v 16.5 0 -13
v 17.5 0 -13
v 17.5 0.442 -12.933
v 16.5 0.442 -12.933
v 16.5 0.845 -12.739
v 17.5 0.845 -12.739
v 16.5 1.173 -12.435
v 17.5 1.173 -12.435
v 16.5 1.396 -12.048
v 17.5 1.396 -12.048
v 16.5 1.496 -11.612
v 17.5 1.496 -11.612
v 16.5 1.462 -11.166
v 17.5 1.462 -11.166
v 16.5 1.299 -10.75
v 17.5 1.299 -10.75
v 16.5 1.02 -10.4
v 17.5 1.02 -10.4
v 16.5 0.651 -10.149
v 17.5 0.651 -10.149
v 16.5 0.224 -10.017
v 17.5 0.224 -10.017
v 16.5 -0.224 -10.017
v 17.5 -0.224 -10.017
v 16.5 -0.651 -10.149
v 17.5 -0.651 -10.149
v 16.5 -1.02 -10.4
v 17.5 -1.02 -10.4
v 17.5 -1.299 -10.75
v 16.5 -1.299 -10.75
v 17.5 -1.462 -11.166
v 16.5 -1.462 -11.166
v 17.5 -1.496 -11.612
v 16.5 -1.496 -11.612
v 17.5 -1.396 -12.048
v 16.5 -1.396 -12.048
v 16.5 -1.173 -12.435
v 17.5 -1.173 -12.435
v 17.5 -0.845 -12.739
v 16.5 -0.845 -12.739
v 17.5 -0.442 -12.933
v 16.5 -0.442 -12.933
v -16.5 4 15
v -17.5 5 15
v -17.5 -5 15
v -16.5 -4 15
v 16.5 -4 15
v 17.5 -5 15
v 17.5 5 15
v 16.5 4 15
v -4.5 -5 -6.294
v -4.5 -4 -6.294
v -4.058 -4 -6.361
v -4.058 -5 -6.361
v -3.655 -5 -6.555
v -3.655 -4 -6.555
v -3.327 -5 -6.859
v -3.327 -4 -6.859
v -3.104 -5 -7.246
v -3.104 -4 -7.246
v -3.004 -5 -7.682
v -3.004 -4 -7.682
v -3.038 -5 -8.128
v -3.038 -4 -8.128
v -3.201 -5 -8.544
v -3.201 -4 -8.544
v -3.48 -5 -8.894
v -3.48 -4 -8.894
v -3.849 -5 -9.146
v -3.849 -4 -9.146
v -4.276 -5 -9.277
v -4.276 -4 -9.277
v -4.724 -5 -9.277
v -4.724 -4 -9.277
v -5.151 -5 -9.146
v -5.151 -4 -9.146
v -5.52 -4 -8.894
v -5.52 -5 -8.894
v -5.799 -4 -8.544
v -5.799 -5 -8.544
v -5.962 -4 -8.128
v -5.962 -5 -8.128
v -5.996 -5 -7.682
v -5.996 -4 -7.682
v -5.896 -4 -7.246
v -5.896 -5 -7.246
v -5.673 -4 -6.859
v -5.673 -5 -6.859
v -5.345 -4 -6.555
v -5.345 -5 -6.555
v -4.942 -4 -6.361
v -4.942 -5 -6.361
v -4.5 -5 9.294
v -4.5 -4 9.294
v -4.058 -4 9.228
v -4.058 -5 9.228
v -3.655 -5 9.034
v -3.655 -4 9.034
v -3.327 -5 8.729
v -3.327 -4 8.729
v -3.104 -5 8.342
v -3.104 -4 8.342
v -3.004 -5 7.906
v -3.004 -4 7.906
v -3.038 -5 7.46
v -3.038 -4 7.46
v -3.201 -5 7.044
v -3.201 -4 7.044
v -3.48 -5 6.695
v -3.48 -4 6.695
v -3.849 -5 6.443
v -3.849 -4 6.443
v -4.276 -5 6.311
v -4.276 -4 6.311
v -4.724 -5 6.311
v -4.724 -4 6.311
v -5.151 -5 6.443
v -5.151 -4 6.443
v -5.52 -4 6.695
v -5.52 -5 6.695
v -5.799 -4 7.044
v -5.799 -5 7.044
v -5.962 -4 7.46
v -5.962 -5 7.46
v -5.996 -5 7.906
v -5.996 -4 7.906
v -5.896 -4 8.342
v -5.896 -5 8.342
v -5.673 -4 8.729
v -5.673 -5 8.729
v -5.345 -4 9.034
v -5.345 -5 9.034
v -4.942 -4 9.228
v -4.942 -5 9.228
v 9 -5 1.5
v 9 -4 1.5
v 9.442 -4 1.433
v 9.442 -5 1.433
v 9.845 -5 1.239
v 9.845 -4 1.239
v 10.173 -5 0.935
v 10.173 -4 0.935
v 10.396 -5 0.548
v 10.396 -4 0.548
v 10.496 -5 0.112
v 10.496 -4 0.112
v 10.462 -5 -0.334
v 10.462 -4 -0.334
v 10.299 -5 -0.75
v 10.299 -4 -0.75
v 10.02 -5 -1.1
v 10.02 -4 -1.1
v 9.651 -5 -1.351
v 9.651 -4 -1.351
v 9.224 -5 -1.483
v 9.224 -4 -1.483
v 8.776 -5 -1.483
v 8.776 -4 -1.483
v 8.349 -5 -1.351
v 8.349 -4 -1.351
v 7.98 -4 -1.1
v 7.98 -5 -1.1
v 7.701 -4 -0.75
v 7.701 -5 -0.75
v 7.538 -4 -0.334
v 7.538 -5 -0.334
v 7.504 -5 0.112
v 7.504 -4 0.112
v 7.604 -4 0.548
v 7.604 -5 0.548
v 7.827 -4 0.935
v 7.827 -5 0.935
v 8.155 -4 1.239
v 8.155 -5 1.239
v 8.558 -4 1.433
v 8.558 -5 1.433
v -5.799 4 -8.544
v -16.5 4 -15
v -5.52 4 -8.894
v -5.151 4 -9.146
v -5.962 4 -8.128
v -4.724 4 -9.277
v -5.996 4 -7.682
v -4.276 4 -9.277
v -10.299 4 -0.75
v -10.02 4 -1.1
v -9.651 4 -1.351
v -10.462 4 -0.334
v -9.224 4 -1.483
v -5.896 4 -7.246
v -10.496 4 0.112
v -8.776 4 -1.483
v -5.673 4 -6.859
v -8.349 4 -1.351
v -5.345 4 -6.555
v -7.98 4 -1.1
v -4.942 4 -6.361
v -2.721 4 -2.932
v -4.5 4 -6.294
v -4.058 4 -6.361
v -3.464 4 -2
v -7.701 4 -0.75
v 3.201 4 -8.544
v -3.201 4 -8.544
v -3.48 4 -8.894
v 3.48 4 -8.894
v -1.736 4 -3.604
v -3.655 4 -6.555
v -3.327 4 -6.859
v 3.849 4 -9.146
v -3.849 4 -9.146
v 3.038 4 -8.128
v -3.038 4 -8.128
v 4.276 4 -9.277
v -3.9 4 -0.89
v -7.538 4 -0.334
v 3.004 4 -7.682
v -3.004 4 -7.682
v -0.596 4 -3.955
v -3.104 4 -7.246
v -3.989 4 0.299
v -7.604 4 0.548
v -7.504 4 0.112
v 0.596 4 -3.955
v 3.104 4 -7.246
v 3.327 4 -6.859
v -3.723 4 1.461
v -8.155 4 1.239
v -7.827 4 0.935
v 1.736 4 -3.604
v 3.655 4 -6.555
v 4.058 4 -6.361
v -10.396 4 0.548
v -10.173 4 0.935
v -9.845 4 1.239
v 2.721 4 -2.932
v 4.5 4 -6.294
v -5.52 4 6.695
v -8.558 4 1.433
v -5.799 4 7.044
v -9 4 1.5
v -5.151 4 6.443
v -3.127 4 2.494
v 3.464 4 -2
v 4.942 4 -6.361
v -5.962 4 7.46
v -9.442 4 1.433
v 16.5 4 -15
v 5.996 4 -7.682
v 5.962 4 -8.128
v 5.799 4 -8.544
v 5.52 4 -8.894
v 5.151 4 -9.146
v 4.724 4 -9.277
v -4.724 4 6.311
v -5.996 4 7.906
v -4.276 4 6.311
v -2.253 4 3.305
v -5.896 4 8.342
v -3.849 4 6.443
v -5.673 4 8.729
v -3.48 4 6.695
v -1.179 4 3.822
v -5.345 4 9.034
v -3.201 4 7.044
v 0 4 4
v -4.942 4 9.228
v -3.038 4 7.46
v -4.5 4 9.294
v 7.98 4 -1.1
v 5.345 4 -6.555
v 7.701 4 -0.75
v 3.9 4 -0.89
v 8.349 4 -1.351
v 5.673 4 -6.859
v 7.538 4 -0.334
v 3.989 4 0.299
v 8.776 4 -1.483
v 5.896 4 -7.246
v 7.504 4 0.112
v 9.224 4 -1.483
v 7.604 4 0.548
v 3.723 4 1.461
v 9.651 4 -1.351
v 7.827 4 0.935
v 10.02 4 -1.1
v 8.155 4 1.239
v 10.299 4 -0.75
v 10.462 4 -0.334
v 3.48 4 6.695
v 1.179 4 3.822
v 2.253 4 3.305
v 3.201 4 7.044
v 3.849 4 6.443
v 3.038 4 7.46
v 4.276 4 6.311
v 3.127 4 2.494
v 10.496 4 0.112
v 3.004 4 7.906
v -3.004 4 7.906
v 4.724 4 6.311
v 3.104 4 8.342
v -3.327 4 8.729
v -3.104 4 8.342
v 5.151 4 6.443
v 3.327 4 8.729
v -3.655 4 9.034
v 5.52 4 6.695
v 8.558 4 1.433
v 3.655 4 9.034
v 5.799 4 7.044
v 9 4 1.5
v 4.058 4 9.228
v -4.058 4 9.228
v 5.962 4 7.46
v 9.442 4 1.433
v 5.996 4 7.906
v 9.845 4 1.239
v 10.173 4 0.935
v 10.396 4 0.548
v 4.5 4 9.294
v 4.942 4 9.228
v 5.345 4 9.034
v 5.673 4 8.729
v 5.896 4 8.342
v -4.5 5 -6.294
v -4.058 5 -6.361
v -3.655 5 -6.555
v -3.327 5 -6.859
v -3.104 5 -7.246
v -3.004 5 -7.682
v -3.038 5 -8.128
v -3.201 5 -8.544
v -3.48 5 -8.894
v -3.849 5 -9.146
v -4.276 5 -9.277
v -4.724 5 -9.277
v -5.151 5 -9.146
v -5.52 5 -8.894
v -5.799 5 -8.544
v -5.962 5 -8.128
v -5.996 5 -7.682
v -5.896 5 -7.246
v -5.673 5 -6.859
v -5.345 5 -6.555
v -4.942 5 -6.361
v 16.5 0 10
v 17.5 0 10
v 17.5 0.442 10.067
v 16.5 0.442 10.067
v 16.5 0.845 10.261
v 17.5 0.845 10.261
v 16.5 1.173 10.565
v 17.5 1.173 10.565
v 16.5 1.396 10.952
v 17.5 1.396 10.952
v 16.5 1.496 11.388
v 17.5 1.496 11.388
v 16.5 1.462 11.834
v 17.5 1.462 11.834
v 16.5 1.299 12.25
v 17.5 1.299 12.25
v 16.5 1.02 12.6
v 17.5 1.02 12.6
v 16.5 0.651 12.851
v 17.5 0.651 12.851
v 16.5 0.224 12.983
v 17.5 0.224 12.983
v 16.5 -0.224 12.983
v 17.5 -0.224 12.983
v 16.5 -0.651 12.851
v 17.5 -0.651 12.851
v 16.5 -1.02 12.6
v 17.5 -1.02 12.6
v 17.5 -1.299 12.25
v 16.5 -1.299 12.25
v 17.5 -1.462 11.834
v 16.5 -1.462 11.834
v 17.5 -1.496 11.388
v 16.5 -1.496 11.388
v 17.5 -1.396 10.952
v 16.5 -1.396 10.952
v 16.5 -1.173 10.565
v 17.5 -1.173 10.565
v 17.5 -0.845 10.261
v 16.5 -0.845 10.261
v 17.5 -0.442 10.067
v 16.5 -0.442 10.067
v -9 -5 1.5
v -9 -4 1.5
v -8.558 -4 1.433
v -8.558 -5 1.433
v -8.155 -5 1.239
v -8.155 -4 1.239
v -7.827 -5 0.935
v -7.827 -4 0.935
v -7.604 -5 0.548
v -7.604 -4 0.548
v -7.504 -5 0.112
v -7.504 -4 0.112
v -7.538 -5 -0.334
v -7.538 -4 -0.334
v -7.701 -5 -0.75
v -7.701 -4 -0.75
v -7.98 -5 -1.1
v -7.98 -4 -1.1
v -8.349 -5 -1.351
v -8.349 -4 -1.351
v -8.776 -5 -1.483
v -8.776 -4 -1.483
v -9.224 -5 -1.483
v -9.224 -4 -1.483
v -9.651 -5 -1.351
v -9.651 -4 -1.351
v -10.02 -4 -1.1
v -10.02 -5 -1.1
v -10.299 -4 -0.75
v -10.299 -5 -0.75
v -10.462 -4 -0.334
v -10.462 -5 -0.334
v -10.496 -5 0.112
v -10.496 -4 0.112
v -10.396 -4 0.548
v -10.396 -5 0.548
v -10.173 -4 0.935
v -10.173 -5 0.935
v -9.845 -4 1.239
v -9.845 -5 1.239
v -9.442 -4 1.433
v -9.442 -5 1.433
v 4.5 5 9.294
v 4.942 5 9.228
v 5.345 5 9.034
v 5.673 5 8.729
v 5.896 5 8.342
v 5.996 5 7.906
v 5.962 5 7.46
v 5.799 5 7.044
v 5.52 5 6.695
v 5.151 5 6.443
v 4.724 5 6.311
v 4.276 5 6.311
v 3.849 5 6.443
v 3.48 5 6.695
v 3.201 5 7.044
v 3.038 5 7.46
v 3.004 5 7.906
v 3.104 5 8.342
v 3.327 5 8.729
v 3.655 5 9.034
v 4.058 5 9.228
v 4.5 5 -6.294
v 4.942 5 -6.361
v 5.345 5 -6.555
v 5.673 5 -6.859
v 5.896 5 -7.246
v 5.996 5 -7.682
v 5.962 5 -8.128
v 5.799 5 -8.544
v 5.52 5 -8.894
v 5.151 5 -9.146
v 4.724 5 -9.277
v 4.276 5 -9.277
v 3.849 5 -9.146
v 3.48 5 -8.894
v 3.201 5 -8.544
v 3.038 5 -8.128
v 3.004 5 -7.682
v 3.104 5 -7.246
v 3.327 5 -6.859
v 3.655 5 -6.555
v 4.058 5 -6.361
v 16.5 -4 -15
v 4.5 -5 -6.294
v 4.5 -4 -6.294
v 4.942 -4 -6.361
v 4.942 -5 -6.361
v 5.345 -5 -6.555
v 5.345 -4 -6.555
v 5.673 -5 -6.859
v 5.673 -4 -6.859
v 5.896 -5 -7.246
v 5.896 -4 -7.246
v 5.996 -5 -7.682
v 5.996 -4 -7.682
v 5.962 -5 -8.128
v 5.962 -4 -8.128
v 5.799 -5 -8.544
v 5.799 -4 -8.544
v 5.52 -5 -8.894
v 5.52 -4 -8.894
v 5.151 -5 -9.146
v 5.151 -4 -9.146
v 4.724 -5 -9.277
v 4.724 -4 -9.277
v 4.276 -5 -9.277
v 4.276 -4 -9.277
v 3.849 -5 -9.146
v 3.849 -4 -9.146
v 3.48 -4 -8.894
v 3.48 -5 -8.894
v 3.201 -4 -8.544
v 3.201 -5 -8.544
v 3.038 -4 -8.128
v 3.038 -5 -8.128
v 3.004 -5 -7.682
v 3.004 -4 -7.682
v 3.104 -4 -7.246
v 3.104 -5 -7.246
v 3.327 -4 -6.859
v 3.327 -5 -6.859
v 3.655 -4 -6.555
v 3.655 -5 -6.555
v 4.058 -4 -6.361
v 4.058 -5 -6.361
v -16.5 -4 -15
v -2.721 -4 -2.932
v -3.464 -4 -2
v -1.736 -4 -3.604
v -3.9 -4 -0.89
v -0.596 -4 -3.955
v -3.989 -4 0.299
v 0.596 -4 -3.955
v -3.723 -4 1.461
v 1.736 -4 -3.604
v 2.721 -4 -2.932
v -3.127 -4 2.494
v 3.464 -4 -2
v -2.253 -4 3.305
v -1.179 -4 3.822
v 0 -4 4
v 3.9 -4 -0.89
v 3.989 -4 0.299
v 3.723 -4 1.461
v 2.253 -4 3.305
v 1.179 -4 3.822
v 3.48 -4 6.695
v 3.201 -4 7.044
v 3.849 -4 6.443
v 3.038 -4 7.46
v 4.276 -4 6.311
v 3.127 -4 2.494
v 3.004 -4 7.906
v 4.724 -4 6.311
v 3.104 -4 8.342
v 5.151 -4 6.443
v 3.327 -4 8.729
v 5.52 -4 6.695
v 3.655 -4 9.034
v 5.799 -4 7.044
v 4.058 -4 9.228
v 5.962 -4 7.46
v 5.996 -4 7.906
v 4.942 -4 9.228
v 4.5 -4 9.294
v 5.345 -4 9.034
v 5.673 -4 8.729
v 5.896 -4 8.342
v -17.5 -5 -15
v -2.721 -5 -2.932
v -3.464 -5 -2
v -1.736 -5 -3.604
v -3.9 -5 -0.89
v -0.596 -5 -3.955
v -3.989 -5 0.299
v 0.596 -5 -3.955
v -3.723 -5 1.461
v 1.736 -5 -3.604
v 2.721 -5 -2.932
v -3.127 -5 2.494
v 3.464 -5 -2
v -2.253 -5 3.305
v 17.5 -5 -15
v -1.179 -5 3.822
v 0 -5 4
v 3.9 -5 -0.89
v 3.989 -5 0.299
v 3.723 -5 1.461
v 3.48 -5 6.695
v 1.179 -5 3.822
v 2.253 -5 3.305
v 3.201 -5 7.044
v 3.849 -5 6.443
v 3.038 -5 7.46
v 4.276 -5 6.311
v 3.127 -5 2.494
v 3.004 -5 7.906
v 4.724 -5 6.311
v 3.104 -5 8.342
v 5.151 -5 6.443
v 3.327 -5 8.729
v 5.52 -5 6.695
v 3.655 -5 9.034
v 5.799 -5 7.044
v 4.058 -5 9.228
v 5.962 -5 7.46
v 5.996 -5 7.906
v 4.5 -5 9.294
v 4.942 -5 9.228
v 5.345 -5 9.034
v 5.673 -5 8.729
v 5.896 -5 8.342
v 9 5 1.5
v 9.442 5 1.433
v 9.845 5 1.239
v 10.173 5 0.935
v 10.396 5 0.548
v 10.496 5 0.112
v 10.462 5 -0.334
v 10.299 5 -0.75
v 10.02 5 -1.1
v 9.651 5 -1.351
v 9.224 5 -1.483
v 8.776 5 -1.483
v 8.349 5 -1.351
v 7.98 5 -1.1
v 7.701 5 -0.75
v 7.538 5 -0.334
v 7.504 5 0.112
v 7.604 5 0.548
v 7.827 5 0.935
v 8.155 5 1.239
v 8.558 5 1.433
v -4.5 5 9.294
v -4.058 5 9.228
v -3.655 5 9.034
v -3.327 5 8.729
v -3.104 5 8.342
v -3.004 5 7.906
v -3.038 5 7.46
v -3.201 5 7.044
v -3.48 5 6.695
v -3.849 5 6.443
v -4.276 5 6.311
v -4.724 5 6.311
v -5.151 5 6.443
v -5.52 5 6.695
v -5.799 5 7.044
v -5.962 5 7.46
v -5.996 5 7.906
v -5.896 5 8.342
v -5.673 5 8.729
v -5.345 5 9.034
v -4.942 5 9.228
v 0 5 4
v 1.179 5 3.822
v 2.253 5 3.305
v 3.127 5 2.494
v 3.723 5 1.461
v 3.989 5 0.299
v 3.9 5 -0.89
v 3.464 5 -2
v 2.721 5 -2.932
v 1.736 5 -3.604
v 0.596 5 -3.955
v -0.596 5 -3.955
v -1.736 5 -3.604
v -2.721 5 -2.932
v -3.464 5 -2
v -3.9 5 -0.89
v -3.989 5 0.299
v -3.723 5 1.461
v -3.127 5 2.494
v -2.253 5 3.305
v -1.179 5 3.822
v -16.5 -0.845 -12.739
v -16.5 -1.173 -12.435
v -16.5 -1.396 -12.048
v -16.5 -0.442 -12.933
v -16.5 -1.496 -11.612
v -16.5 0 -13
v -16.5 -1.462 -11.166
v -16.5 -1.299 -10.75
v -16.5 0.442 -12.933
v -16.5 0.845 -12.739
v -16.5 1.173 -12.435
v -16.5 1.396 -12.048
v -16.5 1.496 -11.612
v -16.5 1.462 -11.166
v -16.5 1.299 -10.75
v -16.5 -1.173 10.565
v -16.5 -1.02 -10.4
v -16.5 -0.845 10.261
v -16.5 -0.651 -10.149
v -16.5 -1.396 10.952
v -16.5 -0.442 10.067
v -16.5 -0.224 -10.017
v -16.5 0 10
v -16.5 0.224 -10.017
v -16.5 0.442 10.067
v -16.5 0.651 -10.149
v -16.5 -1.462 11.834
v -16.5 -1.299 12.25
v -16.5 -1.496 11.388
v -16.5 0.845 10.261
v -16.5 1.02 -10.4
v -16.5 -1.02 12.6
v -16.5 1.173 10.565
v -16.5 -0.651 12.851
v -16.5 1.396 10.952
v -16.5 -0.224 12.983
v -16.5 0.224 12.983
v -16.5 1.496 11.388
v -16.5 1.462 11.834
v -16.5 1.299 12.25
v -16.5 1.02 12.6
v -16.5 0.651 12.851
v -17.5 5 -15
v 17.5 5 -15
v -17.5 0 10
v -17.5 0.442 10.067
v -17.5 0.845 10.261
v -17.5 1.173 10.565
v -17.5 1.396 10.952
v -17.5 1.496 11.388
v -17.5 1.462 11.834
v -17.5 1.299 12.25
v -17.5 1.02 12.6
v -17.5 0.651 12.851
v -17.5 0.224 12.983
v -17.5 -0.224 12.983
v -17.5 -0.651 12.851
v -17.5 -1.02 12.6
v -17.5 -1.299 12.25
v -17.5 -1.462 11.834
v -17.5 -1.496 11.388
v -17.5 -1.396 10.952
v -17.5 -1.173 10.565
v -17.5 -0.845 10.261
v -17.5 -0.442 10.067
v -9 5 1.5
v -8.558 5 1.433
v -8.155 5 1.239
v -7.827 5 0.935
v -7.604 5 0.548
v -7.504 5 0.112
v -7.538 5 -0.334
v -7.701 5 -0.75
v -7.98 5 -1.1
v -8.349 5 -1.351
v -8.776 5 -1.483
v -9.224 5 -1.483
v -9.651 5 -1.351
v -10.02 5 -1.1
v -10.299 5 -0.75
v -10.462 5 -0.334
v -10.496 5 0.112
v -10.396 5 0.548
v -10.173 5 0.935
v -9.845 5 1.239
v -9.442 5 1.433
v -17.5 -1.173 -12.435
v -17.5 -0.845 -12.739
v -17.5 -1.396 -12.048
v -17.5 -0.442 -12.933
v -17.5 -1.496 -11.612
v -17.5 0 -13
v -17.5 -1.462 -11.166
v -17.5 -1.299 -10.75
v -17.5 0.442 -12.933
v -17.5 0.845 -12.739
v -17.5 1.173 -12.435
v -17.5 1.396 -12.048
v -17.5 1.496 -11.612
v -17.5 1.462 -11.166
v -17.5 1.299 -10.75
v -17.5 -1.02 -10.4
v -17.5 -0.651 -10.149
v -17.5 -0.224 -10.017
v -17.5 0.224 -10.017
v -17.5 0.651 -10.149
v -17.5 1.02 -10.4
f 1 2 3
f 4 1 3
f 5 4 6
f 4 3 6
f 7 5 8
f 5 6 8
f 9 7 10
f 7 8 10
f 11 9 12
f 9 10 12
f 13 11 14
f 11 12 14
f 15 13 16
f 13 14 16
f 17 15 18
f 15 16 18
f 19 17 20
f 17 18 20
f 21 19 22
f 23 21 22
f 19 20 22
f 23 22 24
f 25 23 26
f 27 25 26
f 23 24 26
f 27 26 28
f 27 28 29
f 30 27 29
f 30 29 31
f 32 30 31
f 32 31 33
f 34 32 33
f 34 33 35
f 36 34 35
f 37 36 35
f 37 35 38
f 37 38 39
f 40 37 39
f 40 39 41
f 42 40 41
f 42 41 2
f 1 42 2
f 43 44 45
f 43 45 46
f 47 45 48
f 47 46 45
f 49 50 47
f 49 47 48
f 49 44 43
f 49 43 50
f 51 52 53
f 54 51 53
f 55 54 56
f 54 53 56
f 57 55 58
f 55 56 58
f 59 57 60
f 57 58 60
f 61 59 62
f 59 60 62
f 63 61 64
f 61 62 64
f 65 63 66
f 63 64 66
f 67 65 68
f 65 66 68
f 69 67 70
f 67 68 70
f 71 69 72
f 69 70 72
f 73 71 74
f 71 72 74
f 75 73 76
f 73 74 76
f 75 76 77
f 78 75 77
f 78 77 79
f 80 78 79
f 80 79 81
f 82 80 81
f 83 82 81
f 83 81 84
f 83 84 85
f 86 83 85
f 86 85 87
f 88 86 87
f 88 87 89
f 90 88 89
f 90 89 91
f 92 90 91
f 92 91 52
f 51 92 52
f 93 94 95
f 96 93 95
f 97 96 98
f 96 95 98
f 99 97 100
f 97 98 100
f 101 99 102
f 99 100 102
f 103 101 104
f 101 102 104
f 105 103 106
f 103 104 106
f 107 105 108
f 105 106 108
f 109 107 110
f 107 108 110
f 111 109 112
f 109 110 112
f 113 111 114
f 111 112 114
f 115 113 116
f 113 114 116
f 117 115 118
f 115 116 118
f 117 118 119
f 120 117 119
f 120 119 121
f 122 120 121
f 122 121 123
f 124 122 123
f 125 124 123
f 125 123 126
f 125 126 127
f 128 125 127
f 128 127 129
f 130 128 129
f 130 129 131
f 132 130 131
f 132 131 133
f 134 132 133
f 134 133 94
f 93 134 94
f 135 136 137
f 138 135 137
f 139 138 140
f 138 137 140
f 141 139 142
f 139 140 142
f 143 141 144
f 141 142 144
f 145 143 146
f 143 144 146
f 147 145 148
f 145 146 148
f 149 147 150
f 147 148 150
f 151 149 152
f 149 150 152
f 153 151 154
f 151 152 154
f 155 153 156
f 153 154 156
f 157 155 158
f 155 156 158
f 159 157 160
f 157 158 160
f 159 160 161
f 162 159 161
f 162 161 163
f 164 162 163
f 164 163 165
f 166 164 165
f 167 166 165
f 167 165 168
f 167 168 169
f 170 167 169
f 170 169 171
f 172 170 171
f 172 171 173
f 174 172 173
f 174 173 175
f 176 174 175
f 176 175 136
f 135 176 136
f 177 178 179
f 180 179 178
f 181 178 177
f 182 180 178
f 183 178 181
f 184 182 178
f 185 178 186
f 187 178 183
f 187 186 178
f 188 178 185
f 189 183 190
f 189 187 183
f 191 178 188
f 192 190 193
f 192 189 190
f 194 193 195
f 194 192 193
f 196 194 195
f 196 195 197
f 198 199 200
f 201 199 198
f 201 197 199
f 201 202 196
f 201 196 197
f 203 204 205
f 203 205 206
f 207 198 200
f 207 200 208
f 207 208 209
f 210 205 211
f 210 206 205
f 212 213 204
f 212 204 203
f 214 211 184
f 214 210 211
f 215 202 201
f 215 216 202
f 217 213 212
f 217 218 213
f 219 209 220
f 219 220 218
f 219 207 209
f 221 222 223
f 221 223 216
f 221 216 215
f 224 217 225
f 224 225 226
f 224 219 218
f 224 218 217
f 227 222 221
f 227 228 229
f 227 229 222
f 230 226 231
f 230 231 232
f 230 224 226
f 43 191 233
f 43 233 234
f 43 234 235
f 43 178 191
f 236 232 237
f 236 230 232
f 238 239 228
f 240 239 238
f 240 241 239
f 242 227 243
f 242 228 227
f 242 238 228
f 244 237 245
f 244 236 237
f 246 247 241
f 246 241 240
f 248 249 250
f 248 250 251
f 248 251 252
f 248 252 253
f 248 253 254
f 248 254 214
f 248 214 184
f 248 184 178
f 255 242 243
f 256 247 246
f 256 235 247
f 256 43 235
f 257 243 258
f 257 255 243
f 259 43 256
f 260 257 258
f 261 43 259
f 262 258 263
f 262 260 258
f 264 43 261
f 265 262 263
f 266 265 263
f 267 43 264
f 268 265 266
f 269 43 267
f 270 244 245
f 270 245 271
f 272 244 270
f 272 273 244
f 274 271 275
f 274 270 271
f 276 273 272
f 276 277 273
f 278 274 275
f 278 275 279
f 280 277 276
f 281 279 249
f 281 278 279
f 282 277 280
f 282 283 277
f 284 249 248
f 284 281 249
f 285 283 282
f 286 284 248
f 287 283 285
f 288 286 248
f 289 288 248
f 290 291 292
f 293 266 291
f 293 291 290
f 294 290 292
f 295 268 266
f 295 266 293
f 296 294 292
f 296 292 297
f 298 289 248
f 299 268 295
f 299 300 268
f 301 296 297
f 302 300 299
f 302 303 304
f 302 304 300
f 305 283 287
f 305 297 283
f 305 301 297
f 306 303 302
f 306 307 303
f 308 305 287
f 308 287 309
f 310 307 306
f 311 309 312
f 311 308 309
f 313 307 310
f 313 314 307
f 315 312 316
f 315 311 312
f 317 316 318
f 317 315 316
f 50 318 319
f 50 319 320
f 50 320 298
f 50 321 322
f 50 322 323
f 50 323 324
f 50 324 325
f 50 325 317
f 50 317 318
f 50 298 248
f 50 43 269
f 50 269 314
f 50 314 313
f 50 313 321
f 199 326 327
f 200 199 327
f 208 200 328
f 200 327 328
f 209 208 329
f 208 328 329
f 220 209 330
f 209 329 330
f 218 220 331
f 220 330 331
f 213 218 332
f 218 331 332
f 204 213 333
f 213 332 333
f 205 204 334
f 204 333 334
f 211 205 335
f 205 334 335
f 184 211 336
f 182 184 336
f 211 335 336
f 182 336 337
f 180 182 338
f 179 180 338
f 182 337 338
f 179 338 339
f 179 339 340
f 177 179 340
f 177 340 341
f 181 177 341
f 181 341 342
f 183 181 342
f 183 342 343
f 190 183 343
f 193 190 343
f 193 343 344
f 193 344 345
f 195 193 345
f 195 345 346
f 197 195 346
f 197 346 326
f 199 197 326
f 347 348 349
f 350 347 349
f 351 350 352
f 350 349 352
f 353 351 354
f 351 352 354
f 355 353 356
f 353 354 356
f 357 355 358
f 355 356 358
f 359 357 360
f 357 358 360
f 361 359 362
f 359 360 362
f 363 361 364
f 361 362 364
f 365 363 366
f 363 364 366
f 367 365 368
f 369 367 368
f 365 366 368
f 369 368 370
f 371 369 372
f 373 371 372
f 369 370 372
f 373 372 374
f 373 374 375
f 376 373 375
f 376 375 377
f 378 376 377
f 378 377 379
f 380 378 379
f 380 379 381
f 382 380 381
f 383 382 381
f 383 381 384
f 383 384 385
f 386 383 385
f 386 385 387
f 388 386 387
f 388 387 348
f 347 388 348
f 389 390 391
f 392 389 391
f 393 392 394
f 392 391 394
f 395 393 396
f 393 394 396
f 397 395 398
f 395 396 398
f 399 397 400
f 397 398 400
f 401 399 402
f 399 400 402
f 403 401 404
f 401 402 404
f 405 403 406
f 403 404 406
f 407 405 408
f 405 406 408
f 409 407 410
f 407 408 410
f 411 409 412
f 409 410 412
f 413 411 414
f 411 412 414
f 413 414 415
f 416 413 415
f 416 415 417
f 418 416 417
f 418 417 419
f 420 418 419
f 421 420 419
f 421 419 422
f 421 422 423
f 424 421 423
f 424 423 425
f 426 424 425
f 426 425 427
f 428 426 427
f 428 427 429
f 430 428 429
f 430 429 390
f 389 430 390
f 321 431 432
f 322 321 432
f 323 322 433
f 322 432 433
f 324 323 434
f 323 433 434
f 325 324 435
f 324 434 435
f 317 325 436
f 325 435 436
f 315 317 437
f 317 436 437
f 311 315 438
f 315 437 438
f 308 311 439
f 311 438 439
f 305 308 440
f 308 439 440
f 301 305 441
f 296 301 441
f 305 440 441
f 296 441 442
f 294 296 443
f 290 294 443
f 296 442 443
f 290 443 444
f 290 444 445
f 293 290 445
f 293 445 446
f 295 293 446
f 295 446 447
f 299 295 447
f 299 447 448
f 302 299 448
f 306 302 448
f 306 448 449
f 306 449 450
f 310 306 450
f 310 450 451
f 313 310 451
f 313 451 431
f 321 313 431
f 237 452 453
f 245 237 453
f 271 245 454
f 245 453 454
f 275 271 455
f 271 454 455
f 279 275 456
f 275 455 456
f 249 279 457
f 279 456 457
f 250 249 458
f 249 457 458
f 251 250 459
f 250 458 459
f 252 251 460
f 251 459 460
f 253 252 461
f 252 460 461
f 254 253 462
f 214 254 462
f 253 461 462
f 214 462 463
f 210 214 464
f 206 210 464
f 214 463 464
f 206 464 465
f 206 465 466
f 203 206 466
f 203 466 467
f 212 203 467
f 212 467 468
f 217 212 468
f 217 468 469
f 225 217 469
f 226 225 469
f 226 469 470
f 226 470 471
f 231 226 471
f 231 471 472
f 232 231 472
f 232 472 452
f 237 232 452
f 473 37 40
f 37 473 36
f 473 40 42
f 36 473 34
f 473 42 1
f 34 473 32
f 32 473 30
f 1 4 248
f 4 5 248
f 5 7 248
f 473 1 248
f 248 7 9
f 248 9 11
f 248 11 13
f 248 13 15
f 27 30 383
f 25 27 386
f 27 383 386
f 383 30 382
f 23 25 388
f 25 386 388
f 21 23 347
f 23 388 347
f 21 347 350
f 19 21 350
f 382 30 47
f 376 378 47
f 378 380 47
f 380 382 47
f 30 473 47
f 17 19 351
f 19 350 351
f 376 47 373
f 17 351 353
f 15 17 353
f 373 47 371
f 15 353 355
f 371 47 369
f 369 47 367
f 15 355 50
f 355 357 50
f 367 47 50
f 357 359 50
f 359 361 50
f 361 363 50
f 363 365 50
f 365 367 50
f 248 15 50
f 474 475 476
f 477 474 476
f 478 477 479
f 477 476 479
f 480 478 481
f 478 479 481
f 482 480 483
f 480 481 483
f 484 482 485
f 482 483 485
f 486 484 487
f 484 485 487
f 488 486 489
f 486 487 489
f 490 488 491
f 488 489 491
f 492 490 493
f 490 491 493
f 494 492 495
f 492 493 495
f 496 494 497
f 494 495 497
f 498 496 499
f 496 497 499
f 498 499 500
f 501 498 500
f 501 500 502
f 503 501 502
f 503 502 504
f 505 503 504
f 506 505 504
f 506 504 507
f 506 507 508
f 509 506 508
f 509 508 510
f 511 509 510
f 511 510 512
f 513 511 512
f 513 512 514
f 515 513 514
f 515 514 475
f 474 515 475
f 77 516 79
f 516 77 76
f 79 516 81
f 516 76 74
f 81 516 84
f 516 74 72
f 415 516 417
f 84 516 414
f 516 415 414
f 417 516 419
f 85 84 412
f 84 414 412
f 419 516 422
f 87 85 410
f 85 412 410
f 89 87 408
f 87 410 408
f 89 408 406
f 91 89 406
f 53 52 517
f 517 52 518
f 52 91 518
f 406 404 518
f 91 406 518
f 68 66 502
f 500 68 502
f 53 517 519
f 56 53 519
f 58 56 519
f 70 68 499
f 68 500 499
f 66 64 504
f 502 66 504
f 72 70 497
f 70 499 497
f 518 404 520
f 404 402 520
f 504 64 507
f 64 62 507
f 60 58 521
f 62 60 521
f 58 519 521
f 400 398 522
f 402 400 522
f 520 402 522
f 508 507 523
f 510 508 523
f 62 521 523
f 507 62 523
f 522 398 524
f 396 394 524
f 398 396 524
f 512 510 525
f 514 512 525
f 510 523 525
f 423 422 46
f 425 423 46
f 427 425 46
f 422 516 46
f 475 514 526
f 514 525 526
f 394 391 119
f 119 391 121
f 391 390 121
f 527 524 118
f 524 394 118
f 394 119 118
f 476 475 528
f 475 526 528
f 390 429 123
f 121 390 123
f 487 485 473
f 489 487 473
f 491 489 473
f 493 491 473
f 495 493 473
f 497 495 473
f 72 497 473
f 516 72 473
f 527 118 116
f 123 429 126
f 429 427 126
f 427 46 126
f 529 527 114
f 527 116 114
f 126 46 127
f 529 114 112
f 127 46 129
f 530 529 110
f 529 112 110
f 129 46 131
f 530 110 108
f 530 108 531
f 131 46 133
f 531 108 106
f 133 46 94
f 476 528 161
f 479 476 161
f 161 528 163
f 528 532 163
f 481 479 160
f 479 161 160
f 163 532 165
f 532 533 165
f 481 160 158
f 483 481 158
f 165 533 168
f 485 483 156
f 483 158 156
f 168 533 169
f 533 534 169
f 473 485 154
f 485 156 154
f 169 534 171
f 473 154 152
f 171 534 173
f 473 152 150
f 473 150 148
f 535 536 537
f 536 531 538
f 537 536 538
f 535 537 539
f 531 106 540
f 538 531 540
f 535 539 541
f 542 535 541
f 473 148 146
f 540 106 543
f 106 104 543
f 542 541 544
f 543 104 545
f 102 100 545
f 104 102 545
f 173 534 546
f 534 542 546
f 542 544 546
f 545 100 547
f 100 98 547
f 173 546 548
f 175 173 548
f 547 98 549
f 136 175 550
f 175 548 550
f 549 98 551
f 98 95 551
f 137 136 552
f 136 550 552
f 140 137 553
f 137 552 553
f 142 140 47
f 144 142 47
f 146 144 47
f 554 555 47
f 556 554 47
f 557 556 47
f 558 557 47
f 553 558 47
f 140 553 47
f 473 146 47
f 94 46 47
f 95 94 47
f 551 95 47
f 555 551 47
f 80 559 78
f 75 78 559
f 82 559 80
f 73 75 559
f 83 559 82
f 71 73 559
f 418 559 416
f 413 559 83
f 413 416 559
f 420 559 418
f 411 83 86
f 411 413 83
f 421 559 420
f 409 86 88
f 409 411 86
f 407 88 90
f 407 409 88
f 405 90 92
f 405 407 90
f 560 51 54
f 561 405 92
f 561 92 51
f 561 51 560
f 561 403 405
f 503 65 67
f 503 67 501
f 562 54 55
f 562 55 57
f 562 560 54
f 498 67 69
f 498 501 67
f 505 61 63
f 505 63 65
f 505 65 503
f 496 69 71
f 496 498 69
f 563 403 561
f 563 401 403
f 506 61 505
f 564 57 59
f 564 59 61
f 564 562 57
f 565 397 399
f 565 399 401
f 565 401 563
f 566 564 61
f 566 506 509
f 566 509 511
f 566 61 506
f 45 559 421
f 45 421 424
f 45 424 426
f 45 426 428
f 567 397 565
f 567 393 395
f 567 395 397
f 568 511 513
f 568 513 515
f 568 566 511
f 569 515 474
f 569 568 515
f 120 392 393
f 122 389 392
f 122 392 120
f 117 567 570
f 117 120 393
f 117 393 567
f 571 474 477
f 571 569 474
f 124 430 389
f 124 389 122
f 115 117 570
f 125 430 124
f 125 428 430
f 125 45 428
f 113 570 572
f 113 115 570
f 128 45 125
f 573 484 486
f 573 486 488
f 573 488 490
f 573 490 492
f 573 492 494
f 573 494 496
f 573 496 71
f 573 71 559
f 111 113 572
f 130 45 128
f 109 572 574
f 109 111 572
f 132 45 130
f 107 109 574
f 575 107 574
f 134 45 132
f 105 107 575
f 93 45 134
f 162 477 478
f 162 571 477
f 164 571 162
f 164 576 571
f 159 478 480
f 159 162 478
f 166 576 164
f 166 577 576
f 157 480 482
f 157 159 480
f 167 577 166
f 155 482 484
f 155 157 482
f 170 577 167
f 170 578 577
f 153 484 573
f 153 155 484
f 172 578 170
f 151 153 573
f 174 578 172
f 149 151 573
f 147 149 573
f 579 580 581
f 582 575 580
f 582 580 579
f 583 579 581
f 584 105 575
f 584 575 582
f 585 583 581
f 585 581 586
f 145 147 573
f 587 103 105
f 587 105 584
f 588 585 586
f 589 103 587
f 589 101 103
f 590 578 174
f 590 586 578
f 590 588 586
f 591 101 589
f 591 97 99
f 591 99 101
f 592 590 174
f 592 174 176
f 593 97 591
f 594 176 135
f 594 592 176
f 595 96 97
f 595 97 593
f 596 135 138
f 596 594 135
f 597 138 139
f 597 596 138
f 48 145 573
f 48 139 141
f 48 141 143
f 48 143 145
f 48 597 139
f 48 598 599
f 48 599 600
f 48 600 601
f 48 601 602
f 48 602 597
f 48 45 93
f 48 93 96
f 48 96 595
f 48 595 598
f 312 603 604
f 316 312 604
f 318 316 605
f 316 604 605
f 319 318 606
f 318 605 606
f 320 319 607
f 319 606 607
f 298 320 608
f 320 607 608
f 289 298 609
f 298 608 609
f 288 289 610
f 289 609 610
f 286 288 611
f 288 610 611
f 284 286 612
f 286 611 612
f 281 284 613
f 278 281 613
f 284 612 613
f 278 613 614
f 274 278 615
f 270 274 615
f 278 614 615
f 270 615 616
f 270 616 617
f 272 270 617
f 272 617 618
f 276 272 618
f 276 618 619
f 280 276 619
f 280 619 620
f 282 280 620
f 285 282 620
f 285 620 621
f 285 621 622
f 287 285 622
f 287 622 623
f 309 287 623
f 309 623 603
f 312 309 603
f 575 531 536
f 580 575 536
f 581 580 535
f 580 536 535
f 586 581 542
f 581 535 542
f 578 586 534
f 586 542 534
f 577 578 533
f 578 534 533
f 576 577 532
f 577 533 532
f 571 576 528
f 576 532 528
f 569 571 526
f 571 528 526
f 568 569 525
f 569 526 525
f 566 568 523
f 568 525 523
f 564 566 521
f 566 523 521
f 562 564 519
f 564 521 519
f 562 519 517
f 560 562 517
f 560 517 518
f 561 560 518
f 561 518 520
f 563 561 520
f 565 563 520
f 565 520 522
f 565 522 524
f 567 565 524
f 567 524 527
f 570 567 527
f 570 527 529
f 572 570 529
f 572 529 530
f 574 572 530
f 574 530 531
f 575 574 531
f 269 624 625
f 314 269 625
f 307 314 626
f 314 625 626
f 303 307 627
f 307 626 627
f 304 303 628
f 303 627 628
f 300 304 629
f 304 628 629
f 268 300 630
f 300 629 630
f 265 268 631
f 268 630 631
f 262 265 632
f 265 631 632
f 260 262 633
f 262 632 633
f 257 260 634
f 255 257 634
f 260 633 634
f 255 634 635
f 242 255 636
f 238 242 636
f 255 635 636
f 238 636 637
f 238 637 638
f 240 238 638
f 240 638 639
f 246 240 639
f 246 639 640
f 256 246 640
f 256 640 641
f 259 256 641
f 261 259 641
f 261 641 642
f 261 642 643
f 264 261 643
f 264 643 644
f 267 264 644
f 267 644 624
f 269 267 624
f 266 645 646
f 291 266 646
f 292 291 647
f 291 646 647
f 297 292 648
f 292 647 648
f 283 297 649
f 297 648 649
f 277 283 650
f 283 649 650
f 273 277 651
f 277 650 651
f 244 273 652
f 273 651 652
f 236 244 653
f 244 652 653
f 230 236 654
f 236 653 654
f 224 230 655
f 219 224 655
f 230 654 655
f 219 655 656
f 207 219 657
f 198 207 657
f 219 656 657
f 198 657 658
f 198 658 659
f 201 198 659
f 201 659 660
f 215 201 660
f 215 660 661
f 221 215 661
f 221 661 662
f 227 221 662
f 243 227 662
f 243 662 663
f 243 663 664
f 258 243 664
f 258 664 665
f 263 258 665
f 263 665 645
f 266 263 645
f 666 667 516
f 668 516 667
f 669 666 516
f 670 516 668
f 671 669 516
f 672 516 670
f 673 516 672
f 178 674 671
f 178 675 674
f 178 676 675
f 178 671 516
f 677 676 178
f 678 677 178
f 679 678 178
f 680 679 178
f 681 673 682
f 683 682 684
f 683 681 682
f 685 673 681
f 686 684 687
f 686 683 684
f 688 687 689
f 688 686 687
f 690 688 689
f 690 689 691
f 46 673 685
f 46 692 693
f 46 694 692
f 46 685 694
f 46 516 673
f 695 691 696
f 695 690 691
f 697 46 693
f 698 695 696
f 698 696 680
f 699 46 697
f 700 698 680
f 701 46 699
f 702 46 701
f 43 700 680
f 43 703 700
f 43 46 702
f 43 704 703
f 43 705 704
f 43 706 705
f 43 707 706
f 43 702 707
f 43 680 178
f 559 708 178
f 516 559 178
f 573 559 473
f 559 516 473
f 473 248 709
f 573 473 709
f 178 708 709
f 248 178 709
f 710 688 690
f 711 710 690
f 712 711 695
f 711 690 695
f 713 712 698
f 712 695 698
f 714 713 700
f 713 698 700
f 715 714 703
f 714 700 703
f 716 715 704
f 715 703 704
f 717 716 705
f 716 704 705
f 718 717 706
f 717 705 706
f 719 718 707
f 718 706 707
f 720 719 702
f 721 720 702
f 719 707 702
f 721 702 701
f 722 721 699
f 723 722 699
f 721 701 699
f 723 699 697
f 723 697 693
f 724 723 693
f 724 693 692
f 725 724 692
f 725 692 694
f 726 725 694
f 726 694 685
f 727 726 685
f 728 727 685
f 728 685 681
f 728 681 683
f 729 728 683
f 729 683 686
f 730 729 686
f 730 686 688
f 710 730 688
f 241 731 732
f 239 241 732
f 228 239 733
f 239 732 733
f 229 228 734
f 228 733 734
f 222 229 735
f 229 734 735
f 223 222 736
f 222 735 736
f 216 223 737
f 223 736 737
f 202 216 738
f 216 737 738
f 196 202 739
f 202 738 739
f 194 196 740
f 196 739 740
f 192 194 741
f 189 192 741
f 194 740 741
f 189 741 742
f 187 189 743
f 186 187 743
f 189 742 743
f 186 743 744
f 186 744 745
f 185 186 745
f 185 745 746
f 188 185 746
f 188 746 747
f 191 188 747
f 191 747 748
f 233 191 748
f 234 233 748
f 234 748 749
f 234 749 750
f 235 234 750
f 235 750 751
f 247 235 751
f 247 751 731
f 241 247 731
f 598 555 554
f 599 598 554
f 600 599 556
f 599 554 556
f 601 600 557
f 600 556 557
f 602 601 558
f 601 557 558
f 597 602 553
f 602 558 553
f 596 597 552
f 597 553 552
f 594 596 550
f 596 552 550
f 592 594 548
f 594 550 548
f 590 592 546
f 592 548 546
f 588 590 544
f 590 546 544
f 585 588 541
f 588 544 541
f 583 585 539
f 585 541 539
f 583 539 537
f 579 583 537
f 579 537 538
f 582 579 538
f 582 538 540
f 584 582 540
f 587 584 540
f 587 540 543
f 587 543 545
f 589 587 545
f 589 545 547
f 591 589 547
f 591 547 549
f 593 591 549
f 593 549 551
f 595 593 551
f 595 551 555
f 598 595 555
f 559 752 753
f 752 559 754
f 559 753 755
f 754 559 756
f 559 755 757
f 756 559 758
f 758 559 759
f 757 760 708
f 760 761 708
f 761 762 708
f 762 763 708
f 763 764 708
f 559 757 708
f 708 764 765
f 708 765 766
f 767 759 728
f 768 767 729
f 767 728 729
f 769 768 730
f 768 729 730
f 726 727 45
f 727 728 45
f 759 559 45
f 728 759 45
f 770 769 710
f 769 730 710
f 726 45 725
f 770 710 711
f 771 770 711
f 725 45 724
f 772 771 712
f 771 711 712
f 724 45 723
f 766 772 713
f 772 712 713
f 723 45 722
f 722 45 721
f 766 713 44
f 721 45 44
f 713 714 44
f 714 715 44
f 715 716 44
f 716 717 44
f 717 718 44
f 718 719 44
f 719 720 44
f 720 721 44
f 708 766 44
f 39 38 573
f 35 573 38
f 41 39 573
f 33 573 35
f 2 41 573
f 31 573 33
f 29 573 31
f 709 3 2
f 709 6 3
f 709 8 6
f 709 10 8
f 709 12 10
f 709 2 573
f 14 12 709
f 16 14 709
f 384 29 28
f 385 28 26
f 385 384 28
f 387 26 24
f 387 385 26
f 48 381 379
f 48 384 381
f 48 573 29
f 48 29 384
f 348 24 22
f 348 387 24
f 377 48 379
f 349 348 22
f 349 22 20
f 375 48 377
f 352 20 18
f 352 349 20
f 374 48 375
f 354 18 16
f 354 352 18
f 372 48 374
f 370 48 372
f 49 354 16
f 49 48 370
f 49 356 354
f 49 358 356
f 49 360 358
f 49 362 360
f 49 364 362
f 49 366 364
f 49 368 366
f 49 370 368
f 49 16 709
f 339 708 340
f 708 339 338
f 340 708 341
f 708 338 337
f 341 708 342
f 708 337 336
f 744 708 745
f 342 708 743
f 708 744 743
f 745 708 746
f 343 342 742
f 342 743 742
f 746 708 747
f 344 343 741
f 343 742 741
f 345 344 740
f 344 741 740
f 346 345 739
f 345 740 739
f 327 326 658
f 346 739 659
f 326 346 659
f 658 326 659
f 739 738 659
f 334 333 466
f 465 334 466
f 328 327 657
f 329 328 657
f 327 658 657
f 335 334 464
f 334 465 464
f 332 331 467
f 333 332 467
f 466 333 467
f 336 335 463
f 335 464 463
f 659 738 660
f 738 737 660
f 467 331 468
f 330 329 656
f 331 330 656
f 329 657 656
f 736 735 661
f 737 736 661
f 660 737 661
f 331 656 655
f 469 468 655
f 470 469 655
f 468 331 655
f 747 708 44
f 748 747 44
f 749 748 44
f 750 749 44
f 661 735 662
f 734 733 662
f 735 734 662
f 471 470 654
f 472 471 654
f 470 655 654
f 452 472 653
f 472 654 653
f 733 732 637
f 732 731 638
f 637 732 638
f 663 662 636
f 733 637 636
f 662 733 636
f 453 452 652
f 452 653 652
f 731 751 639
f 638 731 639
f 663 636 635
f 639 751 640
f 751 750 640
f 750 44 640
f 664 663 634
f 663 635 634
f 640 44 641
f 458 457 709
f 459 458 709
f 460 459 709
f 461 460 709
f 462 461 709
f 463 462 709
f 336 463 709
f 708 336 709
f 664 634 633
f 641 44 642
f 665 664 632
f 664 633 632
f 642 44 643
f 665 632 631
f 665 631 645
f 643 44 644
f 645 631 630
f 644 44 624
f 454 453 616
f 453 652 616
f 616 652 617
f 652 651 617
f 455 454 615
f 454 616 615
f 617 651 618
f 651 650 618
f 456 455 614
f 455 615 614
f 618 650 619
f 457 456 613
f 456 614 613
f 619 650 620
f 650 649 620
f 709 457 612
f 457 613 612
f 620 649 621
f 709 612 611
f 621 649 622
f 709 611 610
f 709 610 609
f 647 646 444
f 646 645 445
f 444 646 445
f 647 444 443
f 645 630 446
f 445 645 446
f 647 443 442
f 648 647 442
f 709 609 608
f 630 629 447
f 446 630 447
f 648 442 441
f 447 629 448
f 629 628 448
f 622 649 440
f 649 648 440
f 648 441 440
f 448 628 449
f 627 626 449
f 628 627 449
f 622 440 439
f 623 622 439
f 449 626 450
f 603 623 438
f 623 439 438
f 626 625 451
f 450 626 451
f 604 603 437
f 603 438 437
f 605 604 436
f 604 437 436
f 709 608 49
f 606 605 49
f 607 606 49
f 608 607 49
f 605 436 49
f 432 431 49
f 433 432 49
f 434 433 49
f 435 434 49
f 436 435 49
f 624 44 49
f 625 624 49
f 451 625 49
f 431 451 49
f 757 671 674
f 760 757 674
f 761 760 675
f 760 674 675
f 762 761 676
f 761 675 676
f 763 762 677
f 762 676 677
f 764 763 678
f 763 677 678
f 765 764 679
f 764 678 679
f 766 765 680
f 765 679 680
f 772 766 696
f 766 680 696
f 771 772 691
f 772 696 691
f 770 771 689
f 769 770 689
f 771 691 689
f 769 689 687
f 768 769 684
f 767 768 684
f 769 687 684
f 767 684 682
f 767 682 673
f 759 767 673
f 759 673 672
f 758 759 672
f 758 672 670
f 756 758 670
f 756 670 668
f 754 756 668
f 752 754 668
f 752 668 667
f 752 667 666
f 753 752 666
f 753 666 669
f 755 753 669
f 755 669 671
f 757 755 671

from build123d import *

# Parameters (mm, degrees)
SKETCH_1_W          = 35
SKETCH_1_H          = 10
SKETCH_1_W_2        = 33
SKETCH_1_H_2        = 8
EXTRUDE_1_DEPTH     = 15
SKETCH_2_R          = 1.5
CUT_EXTRUDE_1_DEPTH = 50
SKETCH_3_R          = 4
SKETCH_3_R_2        = 1.5
CUT_EXTRUDE_2_DEPTH = 10


with BuildPart() as part:
    # 草图1 → 凸台-拉伸1 (new, symmetric)
    with BuildSketch(Plane.XY):
        Rectangle(SKETCH_1_W, SKETCH_1_H)
        Rectangle(SKETCH_1_W_2, SKETCH_1_H_2, mode=Mode.SUBTRACT)
    extrude(amount=EXTRUDE_1_DEPTH, both=True)

    # 草图2 → 切除-拉伸1 (cut)
    with BuildSketch(Plane(origin=(17.5, 0, 0), x_dir=(0, 0, -1), z_dir=(1, 0, 0))):
        with Locations((11.5, 0)):
            Circle(SKETCH_2_R)
        with Locations((-11.5, 0)):
            Circle(SKETCH_2_R)
    extrude(amount=-CUT_EXTRUDE_1_DEPTH, mode=Mode.SUBTRACT)

    # 草图3 → 切除-拉伸2 (cut)
    with BuildSketch(Plane(origin=(0, 5, 0), x_dir=(1, 0, 0), z_dir=(0, 1, 0))):
        with Locations(Location((0, 0, 0), (0, 0, 270))):
            Circle(SKETCH_3_R)
        with Locations(Location((-4.5, 7.794228634, 0), (0, 0, 270))):
            Circle(SKETCH_3_R_2)
        with Locations(Location((4.5, 7.794228634, 0), (0, 0, 270))):
            Circle(SKETCH_3_R_2)
        with Locations(Location((9, 0, 0), (0, 0, 270))):
            Circle(SKETCH_3_R_2)
        with Locations(Location((4.5, -7.794228634, 0), (0, 0, 270))):
            Circle(SKETCH_3_R_2)
        with Locations(Location((-4.5, -7.794228634, 0), (0, 0, 270))):
            Circle(SKETCH_3_R_2)
        with Locations(Location((-9, 0, 0), (0, 0, 270))):
            Circle(SKETCH_3_R_2)
    extrude(amount=-CUT_EXTRUDE_2_DEPTH, mode=Mode.SUBTRACT)


solid = part.part
